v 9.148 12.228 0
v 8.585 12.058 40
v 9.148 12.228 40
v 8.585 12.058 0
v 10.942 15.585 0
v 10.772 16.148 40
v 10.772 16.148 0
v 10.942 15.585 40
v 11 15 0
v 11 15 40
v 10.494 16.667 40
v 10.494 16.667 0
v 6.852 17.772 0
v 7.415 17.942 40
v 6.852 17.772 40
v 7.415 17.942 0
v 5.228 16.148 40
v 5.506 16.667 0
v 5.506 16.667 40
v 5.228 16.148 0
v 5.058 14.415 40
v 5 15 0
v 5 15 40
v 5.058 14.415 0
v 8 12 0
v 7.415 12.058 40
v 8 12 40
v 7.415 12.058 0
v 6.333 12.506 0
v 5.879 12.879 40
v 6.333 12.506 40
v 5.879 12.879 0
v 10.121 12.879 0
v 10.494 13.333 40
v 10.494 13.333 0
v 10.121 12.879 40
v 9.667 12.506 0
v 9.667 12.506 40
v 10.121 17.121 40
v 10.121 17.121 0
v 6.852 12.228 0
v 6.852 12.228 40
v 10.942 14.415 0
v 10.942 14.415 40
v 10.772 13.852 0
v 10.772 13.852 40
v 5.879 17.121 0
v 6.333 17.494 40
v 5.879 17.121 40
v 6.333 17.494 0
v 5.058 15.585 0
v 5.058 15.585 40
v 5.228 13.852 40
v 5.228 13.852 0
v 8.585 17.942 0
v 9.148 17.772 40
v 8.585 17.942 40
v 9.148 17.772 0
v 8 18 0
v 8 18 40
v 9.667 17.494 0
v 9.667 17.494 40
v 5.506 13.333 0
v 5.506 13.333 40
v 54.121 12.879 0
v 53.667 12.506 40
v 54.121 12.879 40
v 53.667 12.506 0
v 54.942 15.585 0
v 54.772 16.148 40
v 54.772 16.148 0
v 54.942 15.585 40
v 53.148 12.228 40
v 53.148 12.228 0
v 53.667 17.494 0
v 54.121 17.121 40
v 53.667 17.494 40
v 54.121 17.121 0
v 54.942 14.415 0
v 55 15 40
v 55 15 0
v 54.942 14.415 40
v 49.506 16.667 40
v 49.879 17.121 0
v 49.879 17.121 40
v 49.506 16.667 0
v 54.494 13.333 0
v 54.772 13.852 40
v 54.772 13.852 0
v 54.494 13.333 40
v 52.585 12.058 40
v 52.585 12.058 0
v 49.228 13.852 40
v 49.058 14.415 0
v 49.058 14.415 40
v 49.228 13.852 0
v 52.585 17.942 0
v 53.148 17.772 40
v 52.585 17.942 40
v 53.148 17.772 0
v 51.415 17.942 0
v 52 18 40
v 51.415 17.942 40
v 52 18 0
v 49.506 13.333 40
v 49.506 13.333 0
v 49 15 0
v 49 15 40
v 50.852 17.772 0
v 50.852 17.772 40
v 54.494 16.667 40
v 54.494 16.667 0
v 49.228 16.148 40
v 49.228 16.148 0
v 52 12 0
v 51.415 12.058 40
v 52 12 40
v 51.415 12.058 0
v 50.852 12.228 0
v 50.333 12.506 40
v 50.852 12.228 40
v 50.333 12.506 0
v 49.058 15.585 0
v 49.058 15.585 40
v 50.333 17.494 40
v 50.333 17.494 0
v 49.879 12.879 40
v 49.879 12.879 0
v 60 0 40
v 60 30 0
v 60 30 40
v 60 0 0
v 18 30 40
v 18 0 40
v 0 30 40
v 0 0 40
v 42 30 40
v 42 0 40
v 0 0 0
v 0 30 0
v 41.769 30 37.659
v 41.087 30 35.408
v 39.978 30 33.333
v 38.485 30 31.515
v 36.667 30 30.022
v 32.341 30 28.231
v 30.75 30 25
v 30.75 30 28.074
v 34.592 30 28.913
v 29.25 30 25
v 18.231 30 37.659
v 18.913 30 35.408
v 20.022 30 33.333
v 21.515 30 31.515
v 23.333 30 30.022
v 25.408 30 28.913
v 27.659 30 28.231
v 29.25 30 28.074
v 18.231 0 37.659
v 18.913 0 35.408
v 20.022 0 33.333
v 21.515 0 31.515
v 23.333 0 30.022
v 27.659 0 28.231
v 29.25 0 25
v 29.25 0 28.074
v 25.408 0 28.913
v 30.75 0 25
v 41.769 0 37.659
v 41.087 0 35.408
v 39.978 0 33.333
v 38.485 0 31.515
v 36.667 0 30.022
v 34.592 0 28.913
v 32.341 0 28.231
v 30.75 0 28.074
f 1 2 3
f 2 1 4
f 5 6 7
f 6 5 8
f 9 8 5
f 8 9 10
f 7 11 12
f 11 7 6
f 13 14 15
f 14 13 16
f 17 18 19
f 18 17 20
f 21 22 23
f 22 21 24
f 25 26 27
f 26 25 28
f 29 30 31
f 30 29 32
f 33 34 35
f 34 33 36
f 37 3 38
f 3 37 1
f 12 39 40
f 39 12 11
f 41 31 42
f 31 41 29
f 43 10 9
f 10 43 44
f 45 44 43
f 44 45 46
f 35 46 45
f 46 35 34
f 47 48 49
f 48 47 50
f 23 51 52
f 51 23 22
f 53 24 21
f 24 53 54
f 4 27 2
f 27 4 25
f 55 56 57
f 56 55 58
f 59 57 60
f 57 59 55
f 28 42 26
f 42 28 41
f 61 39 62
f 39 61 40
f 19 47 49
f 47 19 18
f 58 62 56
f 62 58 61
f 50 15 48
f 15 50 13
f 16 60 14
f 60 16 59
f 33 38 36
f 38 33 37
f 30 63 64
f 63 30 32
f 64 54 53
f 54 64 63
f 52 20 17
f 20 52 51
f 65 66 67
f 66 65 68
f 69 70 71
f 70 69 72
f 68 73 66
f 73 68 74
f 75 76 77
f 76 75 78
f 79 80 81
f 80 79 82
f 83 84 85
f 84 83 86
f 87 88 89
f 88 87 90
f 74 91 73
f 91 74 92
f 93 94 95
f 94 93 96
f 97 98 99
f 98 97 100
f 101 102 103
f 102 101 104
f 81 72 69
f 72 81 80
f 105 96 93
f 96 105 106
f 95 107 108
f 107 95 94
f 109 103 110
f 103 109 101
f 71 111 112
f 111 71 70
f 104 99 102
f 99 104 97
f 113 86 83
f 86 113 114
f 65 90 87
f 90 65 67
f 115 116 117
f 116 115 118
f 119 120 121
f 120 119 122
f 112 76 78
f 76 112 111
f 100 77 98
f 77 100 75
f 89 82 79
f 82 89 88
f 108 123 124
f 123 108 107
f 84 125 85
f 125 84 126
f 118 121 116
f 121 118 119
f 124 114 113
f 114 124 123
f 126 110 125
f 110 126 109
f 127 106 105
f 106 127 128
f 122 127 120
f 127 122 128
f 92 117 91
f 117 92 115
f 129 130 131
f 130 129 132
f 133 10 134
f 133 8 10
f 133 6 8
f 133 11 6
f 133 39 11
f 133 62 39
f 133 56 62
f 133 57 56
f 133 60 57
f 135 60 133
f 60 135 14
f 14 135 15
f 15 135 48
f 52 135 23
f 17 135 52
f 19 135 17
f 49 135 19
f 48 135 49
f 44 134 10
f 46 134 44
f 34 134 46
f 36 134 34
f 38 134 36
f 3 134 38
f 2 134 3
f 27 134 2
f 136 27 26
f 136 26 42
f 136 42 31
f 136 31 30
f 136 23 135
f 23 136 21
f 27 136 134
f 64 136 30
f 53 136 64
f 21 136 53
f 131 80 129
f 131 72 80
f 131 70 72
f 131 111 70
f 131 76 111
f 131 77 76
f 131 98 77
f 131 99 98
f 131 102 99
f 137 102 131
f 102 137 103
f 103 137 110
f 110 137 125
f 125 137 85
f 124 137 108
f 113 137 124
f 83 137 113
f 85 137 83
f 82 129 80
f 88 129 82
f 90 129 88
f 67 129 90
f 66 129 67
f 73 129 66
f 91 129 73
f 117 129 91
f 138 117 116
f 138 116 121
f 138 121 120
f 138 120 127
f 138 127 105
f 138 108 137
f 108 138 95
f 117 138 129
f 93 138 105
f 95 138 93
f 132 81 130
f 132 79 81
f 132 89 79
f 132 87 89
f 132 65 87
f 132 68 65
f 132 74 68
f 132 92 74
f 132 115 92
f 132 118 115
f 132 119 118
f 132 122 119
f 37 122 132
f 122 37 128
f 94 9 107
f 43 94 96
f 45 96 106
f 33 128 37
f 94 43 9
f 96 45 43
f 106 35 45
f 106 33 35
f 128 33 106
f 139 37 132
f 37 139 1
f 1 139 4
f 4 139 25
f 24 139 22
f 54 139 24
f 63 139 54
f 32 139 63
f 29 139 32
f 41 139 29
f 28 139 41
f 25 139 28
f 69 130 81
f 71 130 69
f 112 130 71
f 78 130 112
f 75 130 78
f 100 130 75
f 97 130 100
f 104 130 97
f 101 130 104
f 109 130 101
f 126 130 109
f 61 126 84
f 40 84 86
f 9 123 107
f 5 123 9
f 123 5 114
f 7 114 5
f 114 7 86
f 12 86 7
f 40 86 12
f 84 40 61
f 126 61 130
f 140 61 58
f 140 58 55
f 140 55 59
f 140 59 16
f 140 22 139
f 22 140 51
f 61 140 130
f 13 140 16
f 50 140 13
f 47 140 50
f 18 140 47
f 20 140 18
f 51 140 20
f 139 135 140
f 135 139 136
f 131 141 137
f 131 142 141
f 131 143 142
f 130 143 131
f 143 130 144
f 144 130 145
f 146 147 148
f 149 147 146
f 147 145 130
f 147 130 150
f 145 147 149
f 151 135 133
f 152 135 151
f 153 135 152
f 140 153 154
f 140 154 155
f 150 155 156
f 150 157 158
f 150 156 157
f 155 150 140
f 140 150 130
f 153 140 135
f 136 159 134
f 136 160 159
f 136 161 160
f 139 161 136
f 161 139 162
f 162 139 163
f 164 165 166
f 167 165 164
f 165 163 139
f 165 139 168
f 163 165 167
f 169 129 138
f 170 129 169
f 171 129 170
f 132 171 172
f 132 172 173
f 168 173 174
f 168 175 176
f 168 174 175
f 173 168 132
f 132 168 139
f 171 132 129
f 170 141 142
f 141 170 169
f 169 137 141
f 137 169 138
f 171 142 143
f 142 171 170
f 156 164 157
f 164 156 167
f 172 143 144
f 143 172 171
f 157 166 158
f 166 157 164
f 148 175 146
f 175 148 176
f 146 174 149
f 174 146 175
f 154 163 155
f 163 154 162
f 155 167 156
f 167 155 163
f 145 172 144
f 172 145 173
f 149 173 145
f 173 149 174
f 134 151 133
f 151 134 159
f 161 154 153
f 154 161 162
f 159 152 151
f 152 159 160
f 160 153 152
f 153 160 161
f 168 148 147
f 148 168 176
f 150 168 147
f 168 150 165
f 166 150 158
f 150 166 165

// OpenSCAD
$fn = 32;

// ----------------------------------------------------------------------
// Saddle clamp: split shaft clamp
// ----------------------------------------------------------------------

// --- parameters (mm) ---
blk_l = 60;               // block length, X
blk_w = 30;               // block width, Y
blk_h = 40;               // block height
clamp_r = 12;             // shaft groove radius
hole_r = 3;               // bolt hole radius
hole_m = 8;               // bolt hole margin from the ends
saw_w = 1.5;              // saw kerf width

saw_depth = clamp_r + 3;  // saw kerf depth

difference() {
  cube([blk_l, blk_w, blk_h]);
  translate([blk_l / 2, -1, blk_h])
    rotate([-90, 0, 0])
      cylinder(h = blk_w + 2, r = clamp_r);
  for (sx = [0, 1])
    translate([sx ? blk_l - hole_m : hole_m, blk_w / 2, -1])
      cylinder(r = hole_r, h = blk_h + 2);
  translate([blk_l / 2 - saw_w / 2, -1, blk_h - saw_depth])
    cube([saw_w, blk_w + 2, saw_depth + 1]);
}
